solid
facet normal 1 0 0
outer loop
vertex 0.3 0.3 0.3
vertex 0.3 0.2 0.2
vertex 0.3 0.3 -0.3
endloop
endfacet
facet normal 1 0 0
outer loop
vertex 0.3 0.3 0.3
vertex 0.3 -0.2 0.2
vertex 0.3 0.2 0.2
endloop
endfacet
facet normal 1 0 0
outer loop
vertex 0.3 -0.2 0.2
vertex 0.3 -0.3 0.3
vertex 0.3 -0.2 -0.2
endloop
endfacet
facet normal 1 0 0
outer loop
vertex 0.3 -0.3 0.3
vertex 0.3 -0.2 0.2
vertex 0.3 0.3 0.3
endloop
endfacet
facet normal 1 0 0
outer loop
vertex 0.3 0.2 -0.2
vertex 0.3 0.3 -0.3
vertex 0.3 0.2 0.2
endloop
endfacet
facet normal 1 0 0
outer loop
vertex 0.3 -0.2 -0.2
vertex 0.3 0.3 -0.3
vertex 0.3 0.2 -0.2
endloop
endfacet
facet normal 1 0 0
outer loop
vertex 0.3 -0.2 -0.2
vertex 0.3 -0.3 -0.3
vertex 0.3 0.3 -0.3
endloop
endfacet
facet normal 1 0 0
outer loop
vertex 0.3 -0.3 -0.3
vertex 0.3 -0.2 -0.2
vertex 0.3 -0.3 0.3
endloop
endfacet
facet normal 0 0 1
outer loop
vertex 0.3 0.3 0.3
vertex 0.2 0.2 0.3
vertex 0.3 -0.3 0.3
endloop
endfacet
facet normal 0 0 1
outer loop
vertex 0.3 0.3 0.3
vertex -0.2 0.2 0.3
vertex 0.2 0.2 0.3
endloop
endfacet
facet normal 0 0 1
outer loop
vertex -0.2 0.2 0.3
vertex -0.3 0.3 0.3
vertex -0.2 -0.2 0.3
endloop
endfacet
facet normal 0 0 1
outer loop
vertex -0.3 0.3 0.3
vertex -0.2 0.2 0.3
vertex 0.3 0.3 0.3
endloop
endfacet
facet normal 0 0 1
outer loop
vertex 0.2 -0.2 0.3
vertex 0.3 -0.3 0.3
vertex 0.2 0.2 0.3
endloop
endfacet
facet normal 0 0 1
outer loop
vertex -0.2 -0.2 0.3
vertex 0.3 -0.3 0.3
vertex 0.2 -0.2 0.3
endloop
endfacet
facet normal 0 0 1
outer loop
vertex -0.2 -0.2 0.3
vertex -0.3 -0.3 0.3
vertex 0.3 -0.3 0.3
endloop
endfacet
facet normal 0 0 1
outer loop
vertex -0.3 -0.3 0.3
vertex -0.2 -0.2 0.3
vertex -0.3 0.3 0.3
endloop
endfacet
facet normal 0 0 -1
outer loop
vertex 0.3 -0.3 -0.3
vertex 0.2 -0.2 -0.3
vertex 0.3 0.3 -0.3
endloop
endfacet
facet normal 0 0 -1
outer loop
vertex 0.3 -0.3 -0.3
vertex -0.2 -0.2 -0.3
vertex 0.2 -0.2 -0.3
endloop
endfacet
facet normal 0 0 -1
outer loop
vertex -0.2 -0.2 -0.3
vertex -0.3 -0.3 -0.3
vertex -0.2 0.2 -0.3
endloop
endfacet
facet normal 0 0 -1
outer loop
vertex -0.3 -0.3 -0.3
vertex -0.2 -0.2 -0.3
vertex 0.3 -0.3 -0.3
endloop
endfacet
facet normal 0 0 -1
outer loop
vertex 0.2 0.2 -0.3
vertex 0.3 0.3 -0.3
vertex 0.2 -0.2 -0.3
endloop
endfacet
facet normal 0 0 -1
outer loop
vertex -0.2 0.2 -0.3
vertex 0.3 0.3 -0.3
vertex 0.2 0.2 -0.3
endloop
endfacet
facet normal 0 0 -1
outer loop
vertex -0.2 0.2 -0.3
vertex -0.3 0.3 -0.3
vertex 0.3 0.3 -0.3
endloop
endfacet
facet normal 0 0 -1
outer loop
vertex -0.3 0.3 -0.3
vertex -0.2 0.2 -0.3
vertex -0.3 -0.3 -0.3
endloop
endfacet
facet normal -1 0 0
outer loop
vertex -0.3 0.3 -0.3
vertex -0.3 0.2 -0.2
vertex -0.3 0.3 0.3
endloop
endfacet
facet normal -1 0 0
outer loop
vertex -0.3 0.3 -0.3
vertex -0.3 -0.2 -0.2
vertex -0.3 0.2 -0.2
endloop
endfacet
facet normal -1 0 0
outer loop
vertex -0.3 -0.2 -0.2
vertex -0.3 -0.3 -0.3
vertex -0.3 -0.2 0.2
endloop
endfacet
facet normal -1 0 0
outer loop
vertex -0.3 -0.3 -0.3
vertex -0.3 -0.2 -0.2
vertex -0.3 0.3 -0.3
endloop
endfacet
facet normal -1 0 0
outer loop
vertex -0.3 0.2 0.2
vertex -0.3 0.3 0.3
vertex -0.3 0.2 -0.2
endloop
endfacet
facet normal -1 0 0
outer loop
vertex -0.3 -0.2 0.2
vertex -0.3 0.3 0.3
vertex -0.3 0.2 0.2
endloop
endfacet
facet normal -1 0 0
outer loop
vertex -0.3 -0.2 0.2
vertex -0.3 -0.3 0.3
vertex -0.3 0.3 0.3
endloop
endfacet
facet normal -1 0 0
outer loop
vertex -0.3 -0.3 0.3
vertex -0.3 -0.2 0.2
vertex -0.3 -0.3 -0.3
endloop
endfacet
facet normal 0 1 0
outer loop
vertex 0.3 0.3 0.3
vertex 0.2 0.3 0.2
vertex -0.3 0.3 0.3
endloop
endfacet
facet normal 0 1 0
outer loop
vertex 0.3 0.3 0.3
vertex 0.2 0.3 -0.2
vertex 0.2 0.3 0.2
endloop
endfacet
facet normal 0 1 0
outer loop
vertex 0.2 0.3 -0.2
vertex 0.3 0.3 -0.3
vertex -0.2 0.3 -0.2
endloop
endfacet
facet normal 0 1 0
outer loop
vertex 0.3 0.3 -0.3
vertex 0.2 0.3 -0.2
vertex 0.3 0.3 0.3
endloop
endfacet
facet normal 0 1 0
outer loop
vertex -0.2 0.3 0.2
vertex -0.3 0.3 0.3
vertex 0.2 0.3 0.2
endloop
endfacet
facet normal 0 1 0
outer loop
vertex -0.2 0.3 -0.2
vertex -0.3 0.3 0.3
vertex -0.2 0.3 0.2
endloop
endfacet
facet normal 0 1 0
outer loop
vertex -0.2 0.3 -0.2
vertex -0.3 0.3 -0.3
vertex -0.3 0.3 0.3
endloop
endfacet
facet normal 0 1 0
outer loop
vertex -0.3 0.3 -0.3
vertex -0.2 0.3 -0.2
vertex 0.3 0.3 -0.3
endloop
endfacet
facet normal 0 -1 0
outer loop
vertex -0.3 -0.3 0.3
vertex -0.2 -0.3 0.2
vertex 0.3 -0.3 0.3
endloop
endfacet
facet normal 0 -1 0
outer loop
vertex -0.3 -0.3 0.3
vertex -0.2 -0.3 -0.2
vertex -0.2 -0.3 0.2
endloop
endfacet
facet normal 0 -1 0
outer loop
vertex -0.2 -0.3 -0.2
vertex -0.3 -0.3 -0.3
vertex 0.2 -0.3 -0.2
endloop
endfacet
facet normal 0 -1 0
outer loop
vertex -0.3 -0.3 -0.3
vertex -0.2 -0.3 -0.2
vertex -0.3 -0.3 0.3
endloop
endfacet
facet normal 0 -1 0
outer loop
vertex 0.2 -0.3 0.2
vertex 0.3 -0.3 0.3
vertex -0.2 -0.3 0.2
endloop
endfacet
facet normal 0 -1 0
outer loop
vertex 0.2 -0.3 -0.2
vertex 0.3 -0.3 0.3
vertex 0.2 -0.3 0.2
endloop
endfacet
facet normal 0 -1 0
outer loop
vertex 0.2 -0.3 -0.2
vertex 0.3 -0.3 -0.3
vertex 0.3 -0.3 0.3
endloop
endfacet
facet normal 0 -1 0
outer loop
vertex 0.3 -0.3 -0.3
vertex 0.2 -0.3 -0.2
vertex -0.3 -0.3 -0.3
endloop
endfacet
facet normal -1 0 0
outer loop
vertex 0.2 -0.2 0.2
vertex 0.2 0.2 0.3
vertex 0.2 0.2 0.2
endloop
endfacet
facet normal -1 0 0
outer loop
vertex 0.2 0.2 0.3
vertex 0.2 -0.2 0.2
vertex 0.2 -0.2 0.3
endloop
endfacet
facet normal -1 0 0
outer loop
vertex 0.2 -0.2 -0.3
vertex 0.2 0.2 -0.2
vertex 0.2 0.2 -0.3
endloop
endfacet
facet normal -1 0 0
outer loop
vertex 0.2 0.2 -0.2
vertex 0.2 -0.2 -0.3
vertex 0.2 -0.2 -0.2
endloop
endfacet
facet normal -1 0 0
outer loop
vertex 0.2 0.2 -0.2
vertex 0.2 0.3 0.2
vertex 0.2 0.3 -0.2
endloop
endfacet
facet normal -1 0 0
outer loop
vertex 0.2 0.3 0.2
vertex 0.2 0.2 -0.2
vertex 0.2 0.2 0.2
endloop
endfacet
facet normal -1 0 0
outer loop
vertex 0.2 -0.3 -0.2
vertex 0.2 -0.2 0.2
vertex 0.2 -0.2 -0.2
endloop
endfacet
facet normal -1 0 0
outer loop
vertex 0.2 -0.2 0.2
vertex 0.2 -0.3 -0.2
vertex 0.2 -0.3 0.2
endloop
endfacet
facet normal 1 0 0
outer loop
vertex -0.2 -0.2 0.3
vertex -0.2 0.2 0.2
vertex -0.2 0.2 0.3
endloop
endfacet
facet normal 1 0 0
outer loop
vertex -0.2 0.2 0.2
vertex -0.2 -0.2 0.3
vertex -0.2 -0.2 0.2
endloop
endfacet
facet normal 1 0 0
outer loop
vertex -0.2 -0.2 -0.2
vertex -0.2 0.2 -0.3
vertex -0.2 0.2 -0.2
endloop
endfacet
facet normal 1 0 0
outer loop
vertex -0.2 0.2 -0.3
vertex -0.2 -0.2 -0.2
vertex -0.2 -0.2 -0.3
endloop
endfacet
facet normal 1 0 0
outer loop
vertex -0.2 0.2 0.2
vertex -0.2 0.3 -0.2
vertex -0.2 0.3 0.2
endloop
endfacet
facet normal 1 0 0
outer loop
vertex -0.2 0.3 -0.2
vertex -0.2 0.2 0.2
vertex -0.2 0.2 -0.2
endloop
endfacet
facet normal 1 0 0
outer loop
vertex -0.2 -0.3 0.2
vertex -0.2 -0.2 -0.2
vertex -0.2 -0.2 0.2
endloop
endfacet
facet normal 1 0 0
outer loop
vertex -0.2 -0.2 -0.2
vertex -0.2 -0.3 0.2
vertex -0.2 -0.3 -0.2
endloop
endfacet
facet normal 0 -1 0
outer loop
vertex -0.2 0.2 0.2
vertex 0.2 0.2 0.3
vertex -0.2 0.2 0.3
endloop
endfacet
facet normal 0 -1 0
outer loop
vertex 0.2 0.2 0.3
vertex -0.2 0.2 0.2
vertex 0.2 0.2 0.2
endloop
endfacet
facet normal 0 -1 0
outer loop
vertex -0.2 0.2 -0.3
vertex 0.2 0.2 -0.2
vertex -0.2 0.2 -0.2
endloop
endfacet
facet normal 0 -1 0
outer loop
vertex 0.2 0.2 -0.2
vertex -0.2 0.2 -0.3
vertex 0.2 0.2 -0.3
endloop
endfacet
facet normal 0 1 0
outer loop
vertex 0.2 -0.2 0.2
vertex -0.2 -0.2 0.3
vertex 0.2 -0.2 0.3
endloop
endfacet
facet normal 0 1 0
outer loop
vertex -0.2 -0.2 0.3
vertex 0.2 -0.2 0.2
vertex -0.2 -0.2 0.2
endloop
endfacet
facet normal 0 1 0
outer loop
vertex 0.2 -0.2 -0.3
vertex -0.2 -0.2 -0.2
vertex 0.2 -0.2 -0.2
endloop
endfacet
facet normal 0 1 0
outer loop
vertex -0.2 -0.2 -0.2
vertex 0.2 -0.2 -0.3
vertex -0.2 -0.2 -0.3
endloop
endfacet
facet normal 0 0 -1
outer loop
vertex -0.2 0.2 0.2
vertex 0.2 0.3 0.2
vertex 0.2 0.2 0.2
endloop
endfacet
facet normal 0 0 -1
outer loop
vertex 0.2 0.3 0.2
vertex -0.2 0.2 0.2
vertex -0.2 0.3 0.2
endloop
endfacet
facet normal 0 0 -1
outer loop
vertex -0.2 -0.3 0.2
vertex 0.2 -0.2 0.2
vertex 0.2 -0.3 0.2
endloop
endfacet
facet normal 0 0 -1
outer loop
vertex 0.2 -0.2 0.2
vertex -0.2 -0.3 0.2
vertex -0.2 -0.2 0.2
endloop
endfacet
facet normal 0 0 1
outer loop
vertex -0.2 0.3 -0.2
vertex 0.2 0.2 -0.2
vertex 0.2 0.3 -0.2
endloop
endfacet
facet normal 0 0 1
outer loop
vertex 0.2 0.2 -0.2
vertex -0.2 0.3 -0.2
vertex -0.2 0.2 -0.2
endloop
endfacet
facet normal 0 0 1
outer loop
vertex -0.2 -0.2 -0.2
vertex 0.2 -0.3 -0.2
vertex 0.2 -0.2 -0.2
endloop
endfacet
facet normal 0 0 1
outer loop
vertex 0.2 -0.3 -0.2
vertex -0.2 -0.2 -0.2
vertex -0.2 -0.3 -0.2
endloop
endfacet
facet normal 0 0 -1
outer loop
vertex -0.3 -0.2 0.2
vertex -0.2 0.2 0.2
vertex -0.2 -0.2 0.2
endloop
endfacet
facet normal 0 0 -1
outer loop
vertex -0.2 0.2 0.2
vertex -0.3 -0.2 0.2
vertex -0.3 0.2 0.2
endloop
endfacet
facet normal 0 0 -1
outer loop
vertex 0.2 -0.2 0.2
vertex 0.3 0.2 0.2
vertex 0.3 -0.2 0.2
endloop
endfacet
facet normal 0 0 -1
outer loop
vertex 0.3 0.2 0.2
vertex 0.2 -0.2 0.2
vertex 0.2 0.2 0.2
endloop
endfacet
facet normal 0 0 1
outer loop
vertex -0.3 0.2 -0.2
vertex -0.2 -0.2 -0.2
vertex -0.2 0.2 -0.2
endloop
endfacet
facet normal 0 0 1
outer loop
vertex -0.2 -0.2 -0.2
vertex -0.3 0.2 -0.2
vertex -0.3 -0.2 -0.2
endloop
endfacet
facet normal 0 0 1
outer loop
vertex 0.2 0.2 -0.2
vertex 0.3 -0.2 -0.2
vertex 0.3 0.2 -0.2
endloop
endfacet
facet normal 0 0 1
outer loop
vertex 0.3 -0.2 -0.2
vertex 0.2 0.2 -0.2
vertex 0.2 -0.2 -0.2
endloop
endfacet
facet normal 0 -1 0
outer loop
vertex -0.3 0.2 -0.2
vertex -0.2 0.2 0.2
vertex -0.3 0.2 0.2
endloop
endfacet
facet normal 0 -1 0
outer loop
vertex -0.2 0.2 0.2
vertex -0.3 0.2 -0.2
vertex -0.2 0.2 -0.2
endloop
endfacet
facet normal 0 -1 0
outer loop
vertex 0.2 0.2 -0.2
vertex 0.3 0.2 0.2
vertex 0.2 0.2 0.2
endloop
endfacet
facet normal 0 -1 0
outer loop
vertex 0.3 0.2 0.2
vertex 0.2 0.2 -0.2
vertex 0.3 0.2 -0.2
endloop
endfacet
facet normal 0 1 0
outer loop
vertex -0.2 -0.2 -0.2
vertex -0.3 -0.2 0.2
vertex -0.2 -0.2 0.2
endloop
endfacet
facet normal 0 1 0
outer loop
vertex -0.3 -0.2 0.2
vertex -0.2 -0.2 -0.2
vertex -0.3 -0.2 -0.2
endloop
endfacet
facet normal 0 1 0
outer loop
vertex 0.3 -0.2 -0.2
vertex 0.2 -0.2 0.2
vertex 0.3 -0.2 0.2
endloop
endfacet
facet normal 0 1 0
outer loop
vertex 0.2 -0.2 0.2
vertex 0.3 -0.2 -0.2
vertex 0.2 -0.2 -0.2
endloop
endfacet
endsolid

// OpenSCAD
use <lib.scad>

module frameHD() {
	difference() {
		rbox([0.6,0.6,0.6],0.01,$fn=8);
		box([0.4,0.4,0.7]);
		box([0.4,0.7,0.4]);
		box([0.7,0.4,0.4]);
	}
}

module frameLD() {
	difference() {
		box([0.6,0.6,0.6]);
		box([0.4,0.4,0.7]);
		box([0.4,0.7,0.4]);
		box([0.7,0.4,0.4]);
	}
}

frameLD();
